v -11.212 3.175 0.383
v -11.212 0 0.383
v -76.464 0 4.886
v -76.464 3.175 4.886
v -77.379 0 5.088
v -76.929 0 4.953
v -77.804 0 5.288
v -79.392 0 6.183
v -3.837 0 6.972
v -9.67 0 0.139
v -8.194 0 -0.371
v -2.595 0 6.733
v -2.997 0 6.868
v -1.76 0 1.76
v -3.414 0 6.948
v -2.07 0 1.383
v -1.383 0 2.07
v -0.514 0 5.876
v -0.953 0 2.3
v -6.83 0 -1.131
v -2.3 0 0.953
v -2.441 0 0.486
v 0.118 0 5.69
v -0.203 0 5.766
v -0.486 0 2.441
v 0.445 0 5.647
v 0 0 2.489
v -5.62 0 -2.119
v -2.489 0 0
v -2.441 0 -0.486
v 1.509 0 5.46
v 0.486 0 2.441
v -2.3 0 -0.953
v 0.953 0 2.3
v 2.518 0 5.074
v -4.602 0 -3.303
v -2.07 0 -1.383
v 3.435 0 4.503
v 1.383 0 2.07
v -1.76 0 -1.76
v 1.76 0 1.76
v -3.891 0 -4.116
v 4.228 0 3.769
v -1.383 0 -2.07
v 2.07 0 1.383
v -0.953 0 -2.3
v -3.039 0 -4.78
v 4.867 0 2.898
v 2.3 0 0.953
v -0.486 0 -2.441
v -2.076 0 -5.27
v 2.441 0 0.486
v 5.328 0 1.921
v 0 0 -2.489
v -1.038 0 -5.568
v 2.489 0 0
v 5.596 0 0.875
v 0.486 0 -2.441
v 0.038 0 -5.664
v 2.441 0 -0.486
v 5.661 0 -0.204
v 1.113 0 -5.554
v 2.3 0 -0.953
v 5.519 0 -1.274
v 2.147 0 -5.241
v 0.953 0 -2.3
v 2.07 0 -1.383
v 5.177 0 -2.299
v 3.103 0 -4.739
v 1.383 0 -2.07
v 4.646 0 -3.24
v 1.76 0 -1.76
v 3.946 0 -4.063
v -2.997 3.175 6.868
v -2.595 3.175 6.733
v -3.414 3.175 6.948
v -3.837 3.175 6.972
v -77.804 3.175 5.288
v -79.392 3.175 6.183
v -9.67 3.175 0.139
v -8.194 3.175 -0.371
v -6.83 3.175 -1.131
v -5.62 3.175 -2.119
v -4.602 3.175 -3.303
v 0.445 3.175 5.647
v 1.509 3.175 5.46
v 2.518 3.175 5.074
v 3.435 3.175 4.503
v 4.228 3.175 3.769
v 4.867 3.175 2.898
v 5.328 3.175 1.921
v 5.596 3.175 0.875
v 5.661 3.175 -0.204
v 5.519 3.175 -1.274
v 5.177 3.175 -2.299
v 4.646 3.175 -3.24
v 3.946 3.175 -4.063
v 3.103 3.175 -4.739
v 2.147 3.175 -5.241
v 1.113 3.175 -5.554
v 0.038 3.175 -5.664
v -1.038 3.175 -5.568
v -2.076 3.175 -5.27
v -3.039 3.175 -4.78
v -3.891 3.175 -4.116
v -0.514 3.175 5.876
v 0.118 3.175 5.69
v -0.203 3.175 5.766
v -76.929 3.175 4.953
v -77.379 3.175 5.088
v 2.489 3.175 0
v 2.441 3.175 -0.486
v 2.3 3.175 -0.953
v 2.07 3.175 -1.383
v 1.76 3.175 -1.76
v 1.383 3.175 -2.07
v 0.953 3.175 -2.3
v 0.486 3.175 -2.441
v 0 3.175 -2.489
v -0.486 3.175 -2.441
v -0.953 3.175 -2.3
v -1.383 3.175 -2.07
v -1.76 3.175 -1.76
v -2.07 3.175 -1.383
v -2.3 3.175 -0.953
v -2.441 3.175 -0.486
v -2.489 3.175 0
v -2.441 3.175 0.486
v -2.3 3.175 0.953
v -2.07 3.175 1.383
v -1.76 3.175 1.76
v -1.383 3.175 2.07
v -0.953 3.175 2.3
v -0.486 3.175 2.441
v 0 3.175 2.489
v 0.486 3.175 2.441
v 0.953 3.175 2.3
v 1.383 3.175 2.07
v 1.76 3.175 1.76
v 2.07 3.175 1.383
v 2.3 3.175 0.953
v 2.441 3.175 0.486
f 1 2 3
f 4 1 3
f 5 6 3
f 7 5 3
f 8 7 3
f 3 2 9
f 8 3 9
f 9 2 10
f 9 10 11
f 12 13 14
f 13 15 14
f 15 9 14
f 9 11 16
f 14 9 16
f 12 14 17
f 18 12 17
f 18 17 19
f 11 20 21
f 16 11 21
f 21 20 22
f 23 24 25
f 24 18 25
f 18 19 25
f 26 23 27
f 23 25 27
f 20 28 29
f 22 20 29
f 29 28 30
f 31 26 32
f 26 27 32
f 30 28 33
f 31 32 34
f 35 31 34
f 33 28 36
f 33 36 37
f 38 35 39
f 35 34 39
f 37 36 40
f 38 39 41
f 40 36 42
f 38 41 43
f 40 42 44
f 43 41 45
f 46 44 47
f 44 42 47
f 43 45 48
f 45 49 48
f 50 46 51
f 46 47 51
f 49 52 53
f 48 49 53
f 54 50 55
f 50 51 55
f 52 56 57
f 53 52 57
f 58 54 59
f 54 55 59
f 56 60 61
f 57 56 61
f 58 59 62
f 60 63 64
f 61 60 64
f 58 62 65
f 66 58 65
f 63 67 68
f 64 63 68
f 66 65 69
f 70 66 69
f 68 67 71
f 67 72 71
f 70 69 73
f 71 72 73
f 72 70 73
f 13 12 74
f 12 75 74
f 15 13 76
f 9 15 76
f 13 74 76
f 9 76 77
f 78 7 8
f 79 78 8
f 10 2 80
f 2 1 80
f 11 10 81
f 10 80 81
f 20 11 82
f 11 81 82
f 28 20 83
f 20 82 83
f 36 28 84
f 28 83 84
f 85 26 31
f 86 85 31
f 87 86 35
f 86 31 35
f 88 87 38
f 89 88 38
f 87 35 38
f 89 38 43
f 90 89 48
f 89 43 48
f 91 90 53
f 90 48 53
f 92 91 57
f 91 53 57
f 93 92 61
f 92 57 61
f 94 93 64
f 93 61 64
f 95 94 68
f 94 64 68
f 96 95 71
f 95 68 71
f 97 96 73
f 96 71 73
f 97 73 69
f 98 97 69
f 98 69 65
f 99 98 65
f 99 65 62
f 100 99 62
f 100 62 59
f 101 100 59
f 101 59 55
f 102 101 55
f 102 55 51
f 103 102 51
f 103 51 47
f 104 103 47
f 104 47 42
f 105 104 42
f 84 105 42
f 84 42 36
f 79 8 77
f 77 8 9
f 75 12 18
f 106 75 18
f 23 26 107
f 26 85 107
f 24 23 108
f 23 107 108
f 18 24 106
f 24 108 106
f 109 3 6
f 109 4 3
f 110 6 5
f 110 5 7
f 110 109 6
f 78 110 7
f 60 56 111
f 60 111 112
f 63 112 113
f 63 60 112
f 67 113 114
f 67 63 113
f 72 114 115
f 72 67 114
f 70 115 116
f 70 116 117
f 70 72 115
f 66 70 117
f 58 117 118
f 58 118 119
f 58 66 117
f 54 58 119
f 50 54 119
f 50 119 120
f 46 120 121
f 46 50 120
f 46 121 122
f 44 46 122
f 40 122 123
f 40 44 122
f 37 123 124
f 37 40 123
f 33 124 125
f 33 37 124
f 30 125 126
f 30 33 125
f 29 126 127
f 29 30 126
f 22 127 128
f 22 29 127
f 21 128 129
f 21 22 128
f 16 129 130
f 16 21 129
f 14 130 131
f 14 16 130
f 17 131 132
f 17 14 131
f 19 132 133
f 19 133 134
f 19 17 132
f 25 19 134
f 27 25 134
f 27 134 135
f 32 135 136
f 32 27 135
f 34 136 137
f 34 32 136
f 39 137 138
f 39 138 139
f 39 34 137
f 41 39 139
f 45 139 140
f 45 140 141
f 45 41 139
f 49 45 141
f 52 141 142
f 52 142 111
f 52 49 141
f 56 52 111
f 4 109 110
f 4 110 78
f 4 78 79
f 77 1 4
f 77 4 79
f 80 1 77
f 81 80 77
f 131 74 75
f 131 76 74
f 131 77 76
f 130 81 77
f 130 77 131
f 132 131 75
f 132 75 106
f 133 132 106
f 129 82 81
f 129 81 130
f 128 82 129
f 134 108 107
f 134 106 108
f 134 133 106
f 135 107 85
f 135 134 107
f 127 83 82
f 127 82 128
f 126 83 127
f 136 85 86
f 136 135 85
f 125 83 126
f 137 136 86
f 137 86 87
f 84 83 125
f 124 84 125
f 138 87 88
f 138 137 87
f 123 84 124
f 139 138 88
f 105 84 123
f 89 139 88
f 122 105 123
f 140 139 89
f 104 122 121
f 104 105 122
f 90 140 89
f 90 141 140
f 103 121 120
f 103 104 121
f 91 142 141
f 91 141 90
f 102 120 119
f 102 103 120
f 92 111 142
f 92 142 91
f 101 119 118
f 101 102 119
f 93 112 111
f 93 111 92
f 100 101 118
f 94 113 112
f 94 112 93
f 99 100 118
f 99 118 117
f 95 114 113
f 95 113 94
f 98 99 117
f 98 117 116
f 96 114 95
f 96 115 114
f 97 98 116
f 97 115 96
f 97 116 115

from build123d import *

# Parameters (mm, degrees)
SKETCH1_R           = 2.4892
BOSS_EXTRUDE1_DEPTH = 3.175
FILLET1_R           = 3.175
FILLET2_R           = 8.89


with BuildPart() as part:
    # Sketch1 → Boss-Extrude1 (new body)
    with BuildSketch(Plane(origin=(0, 0, 0), x_dir=(1, 0, 0), z_dir=(0, 1, 0))):
        with BuildLine():
            Line((-5.6642, 0), (-77.17919455, -4.935559597))
            Line((-77.17919455, -4.935559597), (-79.392042792, -6.182516957))
            Line((-79.392042792, -6.182516957), (-3.192042792, -6.978381463))
            Line((-3.192042792, -6.978381463), (0, -5.6642))
            ThreePointArc((0, -5.6642), (4.00519423, 4.00519423), (-5.6642, 0))
        make_face()
        Circle(SKETCH1_R, mode=Mode.SUBTRACT)
    extrude(amount=BOSS_EXTRUDE1_DEPTH)

    # Fillet1
    fillet1_edges = [part.edges().sort_by_distance(p)[0] for p in [
        (0, 1.5875, 5.6642),
        (-3.192042792, 1.5875, 6.978381463),
        (-77.17919455, 1.5875, 4.935559597),
    ]]
    fillet(fillet1_edges, radius=FILLET1_R)

    # Fillet2
    fillet2_edges = [part.edges().sort_by_distance(p)[0] for p in [
        (-5.6642, 1.5875, 0),
    ]]
    fillet(fillet2_edges, radius=FILLET2_R)


solid = part.part
